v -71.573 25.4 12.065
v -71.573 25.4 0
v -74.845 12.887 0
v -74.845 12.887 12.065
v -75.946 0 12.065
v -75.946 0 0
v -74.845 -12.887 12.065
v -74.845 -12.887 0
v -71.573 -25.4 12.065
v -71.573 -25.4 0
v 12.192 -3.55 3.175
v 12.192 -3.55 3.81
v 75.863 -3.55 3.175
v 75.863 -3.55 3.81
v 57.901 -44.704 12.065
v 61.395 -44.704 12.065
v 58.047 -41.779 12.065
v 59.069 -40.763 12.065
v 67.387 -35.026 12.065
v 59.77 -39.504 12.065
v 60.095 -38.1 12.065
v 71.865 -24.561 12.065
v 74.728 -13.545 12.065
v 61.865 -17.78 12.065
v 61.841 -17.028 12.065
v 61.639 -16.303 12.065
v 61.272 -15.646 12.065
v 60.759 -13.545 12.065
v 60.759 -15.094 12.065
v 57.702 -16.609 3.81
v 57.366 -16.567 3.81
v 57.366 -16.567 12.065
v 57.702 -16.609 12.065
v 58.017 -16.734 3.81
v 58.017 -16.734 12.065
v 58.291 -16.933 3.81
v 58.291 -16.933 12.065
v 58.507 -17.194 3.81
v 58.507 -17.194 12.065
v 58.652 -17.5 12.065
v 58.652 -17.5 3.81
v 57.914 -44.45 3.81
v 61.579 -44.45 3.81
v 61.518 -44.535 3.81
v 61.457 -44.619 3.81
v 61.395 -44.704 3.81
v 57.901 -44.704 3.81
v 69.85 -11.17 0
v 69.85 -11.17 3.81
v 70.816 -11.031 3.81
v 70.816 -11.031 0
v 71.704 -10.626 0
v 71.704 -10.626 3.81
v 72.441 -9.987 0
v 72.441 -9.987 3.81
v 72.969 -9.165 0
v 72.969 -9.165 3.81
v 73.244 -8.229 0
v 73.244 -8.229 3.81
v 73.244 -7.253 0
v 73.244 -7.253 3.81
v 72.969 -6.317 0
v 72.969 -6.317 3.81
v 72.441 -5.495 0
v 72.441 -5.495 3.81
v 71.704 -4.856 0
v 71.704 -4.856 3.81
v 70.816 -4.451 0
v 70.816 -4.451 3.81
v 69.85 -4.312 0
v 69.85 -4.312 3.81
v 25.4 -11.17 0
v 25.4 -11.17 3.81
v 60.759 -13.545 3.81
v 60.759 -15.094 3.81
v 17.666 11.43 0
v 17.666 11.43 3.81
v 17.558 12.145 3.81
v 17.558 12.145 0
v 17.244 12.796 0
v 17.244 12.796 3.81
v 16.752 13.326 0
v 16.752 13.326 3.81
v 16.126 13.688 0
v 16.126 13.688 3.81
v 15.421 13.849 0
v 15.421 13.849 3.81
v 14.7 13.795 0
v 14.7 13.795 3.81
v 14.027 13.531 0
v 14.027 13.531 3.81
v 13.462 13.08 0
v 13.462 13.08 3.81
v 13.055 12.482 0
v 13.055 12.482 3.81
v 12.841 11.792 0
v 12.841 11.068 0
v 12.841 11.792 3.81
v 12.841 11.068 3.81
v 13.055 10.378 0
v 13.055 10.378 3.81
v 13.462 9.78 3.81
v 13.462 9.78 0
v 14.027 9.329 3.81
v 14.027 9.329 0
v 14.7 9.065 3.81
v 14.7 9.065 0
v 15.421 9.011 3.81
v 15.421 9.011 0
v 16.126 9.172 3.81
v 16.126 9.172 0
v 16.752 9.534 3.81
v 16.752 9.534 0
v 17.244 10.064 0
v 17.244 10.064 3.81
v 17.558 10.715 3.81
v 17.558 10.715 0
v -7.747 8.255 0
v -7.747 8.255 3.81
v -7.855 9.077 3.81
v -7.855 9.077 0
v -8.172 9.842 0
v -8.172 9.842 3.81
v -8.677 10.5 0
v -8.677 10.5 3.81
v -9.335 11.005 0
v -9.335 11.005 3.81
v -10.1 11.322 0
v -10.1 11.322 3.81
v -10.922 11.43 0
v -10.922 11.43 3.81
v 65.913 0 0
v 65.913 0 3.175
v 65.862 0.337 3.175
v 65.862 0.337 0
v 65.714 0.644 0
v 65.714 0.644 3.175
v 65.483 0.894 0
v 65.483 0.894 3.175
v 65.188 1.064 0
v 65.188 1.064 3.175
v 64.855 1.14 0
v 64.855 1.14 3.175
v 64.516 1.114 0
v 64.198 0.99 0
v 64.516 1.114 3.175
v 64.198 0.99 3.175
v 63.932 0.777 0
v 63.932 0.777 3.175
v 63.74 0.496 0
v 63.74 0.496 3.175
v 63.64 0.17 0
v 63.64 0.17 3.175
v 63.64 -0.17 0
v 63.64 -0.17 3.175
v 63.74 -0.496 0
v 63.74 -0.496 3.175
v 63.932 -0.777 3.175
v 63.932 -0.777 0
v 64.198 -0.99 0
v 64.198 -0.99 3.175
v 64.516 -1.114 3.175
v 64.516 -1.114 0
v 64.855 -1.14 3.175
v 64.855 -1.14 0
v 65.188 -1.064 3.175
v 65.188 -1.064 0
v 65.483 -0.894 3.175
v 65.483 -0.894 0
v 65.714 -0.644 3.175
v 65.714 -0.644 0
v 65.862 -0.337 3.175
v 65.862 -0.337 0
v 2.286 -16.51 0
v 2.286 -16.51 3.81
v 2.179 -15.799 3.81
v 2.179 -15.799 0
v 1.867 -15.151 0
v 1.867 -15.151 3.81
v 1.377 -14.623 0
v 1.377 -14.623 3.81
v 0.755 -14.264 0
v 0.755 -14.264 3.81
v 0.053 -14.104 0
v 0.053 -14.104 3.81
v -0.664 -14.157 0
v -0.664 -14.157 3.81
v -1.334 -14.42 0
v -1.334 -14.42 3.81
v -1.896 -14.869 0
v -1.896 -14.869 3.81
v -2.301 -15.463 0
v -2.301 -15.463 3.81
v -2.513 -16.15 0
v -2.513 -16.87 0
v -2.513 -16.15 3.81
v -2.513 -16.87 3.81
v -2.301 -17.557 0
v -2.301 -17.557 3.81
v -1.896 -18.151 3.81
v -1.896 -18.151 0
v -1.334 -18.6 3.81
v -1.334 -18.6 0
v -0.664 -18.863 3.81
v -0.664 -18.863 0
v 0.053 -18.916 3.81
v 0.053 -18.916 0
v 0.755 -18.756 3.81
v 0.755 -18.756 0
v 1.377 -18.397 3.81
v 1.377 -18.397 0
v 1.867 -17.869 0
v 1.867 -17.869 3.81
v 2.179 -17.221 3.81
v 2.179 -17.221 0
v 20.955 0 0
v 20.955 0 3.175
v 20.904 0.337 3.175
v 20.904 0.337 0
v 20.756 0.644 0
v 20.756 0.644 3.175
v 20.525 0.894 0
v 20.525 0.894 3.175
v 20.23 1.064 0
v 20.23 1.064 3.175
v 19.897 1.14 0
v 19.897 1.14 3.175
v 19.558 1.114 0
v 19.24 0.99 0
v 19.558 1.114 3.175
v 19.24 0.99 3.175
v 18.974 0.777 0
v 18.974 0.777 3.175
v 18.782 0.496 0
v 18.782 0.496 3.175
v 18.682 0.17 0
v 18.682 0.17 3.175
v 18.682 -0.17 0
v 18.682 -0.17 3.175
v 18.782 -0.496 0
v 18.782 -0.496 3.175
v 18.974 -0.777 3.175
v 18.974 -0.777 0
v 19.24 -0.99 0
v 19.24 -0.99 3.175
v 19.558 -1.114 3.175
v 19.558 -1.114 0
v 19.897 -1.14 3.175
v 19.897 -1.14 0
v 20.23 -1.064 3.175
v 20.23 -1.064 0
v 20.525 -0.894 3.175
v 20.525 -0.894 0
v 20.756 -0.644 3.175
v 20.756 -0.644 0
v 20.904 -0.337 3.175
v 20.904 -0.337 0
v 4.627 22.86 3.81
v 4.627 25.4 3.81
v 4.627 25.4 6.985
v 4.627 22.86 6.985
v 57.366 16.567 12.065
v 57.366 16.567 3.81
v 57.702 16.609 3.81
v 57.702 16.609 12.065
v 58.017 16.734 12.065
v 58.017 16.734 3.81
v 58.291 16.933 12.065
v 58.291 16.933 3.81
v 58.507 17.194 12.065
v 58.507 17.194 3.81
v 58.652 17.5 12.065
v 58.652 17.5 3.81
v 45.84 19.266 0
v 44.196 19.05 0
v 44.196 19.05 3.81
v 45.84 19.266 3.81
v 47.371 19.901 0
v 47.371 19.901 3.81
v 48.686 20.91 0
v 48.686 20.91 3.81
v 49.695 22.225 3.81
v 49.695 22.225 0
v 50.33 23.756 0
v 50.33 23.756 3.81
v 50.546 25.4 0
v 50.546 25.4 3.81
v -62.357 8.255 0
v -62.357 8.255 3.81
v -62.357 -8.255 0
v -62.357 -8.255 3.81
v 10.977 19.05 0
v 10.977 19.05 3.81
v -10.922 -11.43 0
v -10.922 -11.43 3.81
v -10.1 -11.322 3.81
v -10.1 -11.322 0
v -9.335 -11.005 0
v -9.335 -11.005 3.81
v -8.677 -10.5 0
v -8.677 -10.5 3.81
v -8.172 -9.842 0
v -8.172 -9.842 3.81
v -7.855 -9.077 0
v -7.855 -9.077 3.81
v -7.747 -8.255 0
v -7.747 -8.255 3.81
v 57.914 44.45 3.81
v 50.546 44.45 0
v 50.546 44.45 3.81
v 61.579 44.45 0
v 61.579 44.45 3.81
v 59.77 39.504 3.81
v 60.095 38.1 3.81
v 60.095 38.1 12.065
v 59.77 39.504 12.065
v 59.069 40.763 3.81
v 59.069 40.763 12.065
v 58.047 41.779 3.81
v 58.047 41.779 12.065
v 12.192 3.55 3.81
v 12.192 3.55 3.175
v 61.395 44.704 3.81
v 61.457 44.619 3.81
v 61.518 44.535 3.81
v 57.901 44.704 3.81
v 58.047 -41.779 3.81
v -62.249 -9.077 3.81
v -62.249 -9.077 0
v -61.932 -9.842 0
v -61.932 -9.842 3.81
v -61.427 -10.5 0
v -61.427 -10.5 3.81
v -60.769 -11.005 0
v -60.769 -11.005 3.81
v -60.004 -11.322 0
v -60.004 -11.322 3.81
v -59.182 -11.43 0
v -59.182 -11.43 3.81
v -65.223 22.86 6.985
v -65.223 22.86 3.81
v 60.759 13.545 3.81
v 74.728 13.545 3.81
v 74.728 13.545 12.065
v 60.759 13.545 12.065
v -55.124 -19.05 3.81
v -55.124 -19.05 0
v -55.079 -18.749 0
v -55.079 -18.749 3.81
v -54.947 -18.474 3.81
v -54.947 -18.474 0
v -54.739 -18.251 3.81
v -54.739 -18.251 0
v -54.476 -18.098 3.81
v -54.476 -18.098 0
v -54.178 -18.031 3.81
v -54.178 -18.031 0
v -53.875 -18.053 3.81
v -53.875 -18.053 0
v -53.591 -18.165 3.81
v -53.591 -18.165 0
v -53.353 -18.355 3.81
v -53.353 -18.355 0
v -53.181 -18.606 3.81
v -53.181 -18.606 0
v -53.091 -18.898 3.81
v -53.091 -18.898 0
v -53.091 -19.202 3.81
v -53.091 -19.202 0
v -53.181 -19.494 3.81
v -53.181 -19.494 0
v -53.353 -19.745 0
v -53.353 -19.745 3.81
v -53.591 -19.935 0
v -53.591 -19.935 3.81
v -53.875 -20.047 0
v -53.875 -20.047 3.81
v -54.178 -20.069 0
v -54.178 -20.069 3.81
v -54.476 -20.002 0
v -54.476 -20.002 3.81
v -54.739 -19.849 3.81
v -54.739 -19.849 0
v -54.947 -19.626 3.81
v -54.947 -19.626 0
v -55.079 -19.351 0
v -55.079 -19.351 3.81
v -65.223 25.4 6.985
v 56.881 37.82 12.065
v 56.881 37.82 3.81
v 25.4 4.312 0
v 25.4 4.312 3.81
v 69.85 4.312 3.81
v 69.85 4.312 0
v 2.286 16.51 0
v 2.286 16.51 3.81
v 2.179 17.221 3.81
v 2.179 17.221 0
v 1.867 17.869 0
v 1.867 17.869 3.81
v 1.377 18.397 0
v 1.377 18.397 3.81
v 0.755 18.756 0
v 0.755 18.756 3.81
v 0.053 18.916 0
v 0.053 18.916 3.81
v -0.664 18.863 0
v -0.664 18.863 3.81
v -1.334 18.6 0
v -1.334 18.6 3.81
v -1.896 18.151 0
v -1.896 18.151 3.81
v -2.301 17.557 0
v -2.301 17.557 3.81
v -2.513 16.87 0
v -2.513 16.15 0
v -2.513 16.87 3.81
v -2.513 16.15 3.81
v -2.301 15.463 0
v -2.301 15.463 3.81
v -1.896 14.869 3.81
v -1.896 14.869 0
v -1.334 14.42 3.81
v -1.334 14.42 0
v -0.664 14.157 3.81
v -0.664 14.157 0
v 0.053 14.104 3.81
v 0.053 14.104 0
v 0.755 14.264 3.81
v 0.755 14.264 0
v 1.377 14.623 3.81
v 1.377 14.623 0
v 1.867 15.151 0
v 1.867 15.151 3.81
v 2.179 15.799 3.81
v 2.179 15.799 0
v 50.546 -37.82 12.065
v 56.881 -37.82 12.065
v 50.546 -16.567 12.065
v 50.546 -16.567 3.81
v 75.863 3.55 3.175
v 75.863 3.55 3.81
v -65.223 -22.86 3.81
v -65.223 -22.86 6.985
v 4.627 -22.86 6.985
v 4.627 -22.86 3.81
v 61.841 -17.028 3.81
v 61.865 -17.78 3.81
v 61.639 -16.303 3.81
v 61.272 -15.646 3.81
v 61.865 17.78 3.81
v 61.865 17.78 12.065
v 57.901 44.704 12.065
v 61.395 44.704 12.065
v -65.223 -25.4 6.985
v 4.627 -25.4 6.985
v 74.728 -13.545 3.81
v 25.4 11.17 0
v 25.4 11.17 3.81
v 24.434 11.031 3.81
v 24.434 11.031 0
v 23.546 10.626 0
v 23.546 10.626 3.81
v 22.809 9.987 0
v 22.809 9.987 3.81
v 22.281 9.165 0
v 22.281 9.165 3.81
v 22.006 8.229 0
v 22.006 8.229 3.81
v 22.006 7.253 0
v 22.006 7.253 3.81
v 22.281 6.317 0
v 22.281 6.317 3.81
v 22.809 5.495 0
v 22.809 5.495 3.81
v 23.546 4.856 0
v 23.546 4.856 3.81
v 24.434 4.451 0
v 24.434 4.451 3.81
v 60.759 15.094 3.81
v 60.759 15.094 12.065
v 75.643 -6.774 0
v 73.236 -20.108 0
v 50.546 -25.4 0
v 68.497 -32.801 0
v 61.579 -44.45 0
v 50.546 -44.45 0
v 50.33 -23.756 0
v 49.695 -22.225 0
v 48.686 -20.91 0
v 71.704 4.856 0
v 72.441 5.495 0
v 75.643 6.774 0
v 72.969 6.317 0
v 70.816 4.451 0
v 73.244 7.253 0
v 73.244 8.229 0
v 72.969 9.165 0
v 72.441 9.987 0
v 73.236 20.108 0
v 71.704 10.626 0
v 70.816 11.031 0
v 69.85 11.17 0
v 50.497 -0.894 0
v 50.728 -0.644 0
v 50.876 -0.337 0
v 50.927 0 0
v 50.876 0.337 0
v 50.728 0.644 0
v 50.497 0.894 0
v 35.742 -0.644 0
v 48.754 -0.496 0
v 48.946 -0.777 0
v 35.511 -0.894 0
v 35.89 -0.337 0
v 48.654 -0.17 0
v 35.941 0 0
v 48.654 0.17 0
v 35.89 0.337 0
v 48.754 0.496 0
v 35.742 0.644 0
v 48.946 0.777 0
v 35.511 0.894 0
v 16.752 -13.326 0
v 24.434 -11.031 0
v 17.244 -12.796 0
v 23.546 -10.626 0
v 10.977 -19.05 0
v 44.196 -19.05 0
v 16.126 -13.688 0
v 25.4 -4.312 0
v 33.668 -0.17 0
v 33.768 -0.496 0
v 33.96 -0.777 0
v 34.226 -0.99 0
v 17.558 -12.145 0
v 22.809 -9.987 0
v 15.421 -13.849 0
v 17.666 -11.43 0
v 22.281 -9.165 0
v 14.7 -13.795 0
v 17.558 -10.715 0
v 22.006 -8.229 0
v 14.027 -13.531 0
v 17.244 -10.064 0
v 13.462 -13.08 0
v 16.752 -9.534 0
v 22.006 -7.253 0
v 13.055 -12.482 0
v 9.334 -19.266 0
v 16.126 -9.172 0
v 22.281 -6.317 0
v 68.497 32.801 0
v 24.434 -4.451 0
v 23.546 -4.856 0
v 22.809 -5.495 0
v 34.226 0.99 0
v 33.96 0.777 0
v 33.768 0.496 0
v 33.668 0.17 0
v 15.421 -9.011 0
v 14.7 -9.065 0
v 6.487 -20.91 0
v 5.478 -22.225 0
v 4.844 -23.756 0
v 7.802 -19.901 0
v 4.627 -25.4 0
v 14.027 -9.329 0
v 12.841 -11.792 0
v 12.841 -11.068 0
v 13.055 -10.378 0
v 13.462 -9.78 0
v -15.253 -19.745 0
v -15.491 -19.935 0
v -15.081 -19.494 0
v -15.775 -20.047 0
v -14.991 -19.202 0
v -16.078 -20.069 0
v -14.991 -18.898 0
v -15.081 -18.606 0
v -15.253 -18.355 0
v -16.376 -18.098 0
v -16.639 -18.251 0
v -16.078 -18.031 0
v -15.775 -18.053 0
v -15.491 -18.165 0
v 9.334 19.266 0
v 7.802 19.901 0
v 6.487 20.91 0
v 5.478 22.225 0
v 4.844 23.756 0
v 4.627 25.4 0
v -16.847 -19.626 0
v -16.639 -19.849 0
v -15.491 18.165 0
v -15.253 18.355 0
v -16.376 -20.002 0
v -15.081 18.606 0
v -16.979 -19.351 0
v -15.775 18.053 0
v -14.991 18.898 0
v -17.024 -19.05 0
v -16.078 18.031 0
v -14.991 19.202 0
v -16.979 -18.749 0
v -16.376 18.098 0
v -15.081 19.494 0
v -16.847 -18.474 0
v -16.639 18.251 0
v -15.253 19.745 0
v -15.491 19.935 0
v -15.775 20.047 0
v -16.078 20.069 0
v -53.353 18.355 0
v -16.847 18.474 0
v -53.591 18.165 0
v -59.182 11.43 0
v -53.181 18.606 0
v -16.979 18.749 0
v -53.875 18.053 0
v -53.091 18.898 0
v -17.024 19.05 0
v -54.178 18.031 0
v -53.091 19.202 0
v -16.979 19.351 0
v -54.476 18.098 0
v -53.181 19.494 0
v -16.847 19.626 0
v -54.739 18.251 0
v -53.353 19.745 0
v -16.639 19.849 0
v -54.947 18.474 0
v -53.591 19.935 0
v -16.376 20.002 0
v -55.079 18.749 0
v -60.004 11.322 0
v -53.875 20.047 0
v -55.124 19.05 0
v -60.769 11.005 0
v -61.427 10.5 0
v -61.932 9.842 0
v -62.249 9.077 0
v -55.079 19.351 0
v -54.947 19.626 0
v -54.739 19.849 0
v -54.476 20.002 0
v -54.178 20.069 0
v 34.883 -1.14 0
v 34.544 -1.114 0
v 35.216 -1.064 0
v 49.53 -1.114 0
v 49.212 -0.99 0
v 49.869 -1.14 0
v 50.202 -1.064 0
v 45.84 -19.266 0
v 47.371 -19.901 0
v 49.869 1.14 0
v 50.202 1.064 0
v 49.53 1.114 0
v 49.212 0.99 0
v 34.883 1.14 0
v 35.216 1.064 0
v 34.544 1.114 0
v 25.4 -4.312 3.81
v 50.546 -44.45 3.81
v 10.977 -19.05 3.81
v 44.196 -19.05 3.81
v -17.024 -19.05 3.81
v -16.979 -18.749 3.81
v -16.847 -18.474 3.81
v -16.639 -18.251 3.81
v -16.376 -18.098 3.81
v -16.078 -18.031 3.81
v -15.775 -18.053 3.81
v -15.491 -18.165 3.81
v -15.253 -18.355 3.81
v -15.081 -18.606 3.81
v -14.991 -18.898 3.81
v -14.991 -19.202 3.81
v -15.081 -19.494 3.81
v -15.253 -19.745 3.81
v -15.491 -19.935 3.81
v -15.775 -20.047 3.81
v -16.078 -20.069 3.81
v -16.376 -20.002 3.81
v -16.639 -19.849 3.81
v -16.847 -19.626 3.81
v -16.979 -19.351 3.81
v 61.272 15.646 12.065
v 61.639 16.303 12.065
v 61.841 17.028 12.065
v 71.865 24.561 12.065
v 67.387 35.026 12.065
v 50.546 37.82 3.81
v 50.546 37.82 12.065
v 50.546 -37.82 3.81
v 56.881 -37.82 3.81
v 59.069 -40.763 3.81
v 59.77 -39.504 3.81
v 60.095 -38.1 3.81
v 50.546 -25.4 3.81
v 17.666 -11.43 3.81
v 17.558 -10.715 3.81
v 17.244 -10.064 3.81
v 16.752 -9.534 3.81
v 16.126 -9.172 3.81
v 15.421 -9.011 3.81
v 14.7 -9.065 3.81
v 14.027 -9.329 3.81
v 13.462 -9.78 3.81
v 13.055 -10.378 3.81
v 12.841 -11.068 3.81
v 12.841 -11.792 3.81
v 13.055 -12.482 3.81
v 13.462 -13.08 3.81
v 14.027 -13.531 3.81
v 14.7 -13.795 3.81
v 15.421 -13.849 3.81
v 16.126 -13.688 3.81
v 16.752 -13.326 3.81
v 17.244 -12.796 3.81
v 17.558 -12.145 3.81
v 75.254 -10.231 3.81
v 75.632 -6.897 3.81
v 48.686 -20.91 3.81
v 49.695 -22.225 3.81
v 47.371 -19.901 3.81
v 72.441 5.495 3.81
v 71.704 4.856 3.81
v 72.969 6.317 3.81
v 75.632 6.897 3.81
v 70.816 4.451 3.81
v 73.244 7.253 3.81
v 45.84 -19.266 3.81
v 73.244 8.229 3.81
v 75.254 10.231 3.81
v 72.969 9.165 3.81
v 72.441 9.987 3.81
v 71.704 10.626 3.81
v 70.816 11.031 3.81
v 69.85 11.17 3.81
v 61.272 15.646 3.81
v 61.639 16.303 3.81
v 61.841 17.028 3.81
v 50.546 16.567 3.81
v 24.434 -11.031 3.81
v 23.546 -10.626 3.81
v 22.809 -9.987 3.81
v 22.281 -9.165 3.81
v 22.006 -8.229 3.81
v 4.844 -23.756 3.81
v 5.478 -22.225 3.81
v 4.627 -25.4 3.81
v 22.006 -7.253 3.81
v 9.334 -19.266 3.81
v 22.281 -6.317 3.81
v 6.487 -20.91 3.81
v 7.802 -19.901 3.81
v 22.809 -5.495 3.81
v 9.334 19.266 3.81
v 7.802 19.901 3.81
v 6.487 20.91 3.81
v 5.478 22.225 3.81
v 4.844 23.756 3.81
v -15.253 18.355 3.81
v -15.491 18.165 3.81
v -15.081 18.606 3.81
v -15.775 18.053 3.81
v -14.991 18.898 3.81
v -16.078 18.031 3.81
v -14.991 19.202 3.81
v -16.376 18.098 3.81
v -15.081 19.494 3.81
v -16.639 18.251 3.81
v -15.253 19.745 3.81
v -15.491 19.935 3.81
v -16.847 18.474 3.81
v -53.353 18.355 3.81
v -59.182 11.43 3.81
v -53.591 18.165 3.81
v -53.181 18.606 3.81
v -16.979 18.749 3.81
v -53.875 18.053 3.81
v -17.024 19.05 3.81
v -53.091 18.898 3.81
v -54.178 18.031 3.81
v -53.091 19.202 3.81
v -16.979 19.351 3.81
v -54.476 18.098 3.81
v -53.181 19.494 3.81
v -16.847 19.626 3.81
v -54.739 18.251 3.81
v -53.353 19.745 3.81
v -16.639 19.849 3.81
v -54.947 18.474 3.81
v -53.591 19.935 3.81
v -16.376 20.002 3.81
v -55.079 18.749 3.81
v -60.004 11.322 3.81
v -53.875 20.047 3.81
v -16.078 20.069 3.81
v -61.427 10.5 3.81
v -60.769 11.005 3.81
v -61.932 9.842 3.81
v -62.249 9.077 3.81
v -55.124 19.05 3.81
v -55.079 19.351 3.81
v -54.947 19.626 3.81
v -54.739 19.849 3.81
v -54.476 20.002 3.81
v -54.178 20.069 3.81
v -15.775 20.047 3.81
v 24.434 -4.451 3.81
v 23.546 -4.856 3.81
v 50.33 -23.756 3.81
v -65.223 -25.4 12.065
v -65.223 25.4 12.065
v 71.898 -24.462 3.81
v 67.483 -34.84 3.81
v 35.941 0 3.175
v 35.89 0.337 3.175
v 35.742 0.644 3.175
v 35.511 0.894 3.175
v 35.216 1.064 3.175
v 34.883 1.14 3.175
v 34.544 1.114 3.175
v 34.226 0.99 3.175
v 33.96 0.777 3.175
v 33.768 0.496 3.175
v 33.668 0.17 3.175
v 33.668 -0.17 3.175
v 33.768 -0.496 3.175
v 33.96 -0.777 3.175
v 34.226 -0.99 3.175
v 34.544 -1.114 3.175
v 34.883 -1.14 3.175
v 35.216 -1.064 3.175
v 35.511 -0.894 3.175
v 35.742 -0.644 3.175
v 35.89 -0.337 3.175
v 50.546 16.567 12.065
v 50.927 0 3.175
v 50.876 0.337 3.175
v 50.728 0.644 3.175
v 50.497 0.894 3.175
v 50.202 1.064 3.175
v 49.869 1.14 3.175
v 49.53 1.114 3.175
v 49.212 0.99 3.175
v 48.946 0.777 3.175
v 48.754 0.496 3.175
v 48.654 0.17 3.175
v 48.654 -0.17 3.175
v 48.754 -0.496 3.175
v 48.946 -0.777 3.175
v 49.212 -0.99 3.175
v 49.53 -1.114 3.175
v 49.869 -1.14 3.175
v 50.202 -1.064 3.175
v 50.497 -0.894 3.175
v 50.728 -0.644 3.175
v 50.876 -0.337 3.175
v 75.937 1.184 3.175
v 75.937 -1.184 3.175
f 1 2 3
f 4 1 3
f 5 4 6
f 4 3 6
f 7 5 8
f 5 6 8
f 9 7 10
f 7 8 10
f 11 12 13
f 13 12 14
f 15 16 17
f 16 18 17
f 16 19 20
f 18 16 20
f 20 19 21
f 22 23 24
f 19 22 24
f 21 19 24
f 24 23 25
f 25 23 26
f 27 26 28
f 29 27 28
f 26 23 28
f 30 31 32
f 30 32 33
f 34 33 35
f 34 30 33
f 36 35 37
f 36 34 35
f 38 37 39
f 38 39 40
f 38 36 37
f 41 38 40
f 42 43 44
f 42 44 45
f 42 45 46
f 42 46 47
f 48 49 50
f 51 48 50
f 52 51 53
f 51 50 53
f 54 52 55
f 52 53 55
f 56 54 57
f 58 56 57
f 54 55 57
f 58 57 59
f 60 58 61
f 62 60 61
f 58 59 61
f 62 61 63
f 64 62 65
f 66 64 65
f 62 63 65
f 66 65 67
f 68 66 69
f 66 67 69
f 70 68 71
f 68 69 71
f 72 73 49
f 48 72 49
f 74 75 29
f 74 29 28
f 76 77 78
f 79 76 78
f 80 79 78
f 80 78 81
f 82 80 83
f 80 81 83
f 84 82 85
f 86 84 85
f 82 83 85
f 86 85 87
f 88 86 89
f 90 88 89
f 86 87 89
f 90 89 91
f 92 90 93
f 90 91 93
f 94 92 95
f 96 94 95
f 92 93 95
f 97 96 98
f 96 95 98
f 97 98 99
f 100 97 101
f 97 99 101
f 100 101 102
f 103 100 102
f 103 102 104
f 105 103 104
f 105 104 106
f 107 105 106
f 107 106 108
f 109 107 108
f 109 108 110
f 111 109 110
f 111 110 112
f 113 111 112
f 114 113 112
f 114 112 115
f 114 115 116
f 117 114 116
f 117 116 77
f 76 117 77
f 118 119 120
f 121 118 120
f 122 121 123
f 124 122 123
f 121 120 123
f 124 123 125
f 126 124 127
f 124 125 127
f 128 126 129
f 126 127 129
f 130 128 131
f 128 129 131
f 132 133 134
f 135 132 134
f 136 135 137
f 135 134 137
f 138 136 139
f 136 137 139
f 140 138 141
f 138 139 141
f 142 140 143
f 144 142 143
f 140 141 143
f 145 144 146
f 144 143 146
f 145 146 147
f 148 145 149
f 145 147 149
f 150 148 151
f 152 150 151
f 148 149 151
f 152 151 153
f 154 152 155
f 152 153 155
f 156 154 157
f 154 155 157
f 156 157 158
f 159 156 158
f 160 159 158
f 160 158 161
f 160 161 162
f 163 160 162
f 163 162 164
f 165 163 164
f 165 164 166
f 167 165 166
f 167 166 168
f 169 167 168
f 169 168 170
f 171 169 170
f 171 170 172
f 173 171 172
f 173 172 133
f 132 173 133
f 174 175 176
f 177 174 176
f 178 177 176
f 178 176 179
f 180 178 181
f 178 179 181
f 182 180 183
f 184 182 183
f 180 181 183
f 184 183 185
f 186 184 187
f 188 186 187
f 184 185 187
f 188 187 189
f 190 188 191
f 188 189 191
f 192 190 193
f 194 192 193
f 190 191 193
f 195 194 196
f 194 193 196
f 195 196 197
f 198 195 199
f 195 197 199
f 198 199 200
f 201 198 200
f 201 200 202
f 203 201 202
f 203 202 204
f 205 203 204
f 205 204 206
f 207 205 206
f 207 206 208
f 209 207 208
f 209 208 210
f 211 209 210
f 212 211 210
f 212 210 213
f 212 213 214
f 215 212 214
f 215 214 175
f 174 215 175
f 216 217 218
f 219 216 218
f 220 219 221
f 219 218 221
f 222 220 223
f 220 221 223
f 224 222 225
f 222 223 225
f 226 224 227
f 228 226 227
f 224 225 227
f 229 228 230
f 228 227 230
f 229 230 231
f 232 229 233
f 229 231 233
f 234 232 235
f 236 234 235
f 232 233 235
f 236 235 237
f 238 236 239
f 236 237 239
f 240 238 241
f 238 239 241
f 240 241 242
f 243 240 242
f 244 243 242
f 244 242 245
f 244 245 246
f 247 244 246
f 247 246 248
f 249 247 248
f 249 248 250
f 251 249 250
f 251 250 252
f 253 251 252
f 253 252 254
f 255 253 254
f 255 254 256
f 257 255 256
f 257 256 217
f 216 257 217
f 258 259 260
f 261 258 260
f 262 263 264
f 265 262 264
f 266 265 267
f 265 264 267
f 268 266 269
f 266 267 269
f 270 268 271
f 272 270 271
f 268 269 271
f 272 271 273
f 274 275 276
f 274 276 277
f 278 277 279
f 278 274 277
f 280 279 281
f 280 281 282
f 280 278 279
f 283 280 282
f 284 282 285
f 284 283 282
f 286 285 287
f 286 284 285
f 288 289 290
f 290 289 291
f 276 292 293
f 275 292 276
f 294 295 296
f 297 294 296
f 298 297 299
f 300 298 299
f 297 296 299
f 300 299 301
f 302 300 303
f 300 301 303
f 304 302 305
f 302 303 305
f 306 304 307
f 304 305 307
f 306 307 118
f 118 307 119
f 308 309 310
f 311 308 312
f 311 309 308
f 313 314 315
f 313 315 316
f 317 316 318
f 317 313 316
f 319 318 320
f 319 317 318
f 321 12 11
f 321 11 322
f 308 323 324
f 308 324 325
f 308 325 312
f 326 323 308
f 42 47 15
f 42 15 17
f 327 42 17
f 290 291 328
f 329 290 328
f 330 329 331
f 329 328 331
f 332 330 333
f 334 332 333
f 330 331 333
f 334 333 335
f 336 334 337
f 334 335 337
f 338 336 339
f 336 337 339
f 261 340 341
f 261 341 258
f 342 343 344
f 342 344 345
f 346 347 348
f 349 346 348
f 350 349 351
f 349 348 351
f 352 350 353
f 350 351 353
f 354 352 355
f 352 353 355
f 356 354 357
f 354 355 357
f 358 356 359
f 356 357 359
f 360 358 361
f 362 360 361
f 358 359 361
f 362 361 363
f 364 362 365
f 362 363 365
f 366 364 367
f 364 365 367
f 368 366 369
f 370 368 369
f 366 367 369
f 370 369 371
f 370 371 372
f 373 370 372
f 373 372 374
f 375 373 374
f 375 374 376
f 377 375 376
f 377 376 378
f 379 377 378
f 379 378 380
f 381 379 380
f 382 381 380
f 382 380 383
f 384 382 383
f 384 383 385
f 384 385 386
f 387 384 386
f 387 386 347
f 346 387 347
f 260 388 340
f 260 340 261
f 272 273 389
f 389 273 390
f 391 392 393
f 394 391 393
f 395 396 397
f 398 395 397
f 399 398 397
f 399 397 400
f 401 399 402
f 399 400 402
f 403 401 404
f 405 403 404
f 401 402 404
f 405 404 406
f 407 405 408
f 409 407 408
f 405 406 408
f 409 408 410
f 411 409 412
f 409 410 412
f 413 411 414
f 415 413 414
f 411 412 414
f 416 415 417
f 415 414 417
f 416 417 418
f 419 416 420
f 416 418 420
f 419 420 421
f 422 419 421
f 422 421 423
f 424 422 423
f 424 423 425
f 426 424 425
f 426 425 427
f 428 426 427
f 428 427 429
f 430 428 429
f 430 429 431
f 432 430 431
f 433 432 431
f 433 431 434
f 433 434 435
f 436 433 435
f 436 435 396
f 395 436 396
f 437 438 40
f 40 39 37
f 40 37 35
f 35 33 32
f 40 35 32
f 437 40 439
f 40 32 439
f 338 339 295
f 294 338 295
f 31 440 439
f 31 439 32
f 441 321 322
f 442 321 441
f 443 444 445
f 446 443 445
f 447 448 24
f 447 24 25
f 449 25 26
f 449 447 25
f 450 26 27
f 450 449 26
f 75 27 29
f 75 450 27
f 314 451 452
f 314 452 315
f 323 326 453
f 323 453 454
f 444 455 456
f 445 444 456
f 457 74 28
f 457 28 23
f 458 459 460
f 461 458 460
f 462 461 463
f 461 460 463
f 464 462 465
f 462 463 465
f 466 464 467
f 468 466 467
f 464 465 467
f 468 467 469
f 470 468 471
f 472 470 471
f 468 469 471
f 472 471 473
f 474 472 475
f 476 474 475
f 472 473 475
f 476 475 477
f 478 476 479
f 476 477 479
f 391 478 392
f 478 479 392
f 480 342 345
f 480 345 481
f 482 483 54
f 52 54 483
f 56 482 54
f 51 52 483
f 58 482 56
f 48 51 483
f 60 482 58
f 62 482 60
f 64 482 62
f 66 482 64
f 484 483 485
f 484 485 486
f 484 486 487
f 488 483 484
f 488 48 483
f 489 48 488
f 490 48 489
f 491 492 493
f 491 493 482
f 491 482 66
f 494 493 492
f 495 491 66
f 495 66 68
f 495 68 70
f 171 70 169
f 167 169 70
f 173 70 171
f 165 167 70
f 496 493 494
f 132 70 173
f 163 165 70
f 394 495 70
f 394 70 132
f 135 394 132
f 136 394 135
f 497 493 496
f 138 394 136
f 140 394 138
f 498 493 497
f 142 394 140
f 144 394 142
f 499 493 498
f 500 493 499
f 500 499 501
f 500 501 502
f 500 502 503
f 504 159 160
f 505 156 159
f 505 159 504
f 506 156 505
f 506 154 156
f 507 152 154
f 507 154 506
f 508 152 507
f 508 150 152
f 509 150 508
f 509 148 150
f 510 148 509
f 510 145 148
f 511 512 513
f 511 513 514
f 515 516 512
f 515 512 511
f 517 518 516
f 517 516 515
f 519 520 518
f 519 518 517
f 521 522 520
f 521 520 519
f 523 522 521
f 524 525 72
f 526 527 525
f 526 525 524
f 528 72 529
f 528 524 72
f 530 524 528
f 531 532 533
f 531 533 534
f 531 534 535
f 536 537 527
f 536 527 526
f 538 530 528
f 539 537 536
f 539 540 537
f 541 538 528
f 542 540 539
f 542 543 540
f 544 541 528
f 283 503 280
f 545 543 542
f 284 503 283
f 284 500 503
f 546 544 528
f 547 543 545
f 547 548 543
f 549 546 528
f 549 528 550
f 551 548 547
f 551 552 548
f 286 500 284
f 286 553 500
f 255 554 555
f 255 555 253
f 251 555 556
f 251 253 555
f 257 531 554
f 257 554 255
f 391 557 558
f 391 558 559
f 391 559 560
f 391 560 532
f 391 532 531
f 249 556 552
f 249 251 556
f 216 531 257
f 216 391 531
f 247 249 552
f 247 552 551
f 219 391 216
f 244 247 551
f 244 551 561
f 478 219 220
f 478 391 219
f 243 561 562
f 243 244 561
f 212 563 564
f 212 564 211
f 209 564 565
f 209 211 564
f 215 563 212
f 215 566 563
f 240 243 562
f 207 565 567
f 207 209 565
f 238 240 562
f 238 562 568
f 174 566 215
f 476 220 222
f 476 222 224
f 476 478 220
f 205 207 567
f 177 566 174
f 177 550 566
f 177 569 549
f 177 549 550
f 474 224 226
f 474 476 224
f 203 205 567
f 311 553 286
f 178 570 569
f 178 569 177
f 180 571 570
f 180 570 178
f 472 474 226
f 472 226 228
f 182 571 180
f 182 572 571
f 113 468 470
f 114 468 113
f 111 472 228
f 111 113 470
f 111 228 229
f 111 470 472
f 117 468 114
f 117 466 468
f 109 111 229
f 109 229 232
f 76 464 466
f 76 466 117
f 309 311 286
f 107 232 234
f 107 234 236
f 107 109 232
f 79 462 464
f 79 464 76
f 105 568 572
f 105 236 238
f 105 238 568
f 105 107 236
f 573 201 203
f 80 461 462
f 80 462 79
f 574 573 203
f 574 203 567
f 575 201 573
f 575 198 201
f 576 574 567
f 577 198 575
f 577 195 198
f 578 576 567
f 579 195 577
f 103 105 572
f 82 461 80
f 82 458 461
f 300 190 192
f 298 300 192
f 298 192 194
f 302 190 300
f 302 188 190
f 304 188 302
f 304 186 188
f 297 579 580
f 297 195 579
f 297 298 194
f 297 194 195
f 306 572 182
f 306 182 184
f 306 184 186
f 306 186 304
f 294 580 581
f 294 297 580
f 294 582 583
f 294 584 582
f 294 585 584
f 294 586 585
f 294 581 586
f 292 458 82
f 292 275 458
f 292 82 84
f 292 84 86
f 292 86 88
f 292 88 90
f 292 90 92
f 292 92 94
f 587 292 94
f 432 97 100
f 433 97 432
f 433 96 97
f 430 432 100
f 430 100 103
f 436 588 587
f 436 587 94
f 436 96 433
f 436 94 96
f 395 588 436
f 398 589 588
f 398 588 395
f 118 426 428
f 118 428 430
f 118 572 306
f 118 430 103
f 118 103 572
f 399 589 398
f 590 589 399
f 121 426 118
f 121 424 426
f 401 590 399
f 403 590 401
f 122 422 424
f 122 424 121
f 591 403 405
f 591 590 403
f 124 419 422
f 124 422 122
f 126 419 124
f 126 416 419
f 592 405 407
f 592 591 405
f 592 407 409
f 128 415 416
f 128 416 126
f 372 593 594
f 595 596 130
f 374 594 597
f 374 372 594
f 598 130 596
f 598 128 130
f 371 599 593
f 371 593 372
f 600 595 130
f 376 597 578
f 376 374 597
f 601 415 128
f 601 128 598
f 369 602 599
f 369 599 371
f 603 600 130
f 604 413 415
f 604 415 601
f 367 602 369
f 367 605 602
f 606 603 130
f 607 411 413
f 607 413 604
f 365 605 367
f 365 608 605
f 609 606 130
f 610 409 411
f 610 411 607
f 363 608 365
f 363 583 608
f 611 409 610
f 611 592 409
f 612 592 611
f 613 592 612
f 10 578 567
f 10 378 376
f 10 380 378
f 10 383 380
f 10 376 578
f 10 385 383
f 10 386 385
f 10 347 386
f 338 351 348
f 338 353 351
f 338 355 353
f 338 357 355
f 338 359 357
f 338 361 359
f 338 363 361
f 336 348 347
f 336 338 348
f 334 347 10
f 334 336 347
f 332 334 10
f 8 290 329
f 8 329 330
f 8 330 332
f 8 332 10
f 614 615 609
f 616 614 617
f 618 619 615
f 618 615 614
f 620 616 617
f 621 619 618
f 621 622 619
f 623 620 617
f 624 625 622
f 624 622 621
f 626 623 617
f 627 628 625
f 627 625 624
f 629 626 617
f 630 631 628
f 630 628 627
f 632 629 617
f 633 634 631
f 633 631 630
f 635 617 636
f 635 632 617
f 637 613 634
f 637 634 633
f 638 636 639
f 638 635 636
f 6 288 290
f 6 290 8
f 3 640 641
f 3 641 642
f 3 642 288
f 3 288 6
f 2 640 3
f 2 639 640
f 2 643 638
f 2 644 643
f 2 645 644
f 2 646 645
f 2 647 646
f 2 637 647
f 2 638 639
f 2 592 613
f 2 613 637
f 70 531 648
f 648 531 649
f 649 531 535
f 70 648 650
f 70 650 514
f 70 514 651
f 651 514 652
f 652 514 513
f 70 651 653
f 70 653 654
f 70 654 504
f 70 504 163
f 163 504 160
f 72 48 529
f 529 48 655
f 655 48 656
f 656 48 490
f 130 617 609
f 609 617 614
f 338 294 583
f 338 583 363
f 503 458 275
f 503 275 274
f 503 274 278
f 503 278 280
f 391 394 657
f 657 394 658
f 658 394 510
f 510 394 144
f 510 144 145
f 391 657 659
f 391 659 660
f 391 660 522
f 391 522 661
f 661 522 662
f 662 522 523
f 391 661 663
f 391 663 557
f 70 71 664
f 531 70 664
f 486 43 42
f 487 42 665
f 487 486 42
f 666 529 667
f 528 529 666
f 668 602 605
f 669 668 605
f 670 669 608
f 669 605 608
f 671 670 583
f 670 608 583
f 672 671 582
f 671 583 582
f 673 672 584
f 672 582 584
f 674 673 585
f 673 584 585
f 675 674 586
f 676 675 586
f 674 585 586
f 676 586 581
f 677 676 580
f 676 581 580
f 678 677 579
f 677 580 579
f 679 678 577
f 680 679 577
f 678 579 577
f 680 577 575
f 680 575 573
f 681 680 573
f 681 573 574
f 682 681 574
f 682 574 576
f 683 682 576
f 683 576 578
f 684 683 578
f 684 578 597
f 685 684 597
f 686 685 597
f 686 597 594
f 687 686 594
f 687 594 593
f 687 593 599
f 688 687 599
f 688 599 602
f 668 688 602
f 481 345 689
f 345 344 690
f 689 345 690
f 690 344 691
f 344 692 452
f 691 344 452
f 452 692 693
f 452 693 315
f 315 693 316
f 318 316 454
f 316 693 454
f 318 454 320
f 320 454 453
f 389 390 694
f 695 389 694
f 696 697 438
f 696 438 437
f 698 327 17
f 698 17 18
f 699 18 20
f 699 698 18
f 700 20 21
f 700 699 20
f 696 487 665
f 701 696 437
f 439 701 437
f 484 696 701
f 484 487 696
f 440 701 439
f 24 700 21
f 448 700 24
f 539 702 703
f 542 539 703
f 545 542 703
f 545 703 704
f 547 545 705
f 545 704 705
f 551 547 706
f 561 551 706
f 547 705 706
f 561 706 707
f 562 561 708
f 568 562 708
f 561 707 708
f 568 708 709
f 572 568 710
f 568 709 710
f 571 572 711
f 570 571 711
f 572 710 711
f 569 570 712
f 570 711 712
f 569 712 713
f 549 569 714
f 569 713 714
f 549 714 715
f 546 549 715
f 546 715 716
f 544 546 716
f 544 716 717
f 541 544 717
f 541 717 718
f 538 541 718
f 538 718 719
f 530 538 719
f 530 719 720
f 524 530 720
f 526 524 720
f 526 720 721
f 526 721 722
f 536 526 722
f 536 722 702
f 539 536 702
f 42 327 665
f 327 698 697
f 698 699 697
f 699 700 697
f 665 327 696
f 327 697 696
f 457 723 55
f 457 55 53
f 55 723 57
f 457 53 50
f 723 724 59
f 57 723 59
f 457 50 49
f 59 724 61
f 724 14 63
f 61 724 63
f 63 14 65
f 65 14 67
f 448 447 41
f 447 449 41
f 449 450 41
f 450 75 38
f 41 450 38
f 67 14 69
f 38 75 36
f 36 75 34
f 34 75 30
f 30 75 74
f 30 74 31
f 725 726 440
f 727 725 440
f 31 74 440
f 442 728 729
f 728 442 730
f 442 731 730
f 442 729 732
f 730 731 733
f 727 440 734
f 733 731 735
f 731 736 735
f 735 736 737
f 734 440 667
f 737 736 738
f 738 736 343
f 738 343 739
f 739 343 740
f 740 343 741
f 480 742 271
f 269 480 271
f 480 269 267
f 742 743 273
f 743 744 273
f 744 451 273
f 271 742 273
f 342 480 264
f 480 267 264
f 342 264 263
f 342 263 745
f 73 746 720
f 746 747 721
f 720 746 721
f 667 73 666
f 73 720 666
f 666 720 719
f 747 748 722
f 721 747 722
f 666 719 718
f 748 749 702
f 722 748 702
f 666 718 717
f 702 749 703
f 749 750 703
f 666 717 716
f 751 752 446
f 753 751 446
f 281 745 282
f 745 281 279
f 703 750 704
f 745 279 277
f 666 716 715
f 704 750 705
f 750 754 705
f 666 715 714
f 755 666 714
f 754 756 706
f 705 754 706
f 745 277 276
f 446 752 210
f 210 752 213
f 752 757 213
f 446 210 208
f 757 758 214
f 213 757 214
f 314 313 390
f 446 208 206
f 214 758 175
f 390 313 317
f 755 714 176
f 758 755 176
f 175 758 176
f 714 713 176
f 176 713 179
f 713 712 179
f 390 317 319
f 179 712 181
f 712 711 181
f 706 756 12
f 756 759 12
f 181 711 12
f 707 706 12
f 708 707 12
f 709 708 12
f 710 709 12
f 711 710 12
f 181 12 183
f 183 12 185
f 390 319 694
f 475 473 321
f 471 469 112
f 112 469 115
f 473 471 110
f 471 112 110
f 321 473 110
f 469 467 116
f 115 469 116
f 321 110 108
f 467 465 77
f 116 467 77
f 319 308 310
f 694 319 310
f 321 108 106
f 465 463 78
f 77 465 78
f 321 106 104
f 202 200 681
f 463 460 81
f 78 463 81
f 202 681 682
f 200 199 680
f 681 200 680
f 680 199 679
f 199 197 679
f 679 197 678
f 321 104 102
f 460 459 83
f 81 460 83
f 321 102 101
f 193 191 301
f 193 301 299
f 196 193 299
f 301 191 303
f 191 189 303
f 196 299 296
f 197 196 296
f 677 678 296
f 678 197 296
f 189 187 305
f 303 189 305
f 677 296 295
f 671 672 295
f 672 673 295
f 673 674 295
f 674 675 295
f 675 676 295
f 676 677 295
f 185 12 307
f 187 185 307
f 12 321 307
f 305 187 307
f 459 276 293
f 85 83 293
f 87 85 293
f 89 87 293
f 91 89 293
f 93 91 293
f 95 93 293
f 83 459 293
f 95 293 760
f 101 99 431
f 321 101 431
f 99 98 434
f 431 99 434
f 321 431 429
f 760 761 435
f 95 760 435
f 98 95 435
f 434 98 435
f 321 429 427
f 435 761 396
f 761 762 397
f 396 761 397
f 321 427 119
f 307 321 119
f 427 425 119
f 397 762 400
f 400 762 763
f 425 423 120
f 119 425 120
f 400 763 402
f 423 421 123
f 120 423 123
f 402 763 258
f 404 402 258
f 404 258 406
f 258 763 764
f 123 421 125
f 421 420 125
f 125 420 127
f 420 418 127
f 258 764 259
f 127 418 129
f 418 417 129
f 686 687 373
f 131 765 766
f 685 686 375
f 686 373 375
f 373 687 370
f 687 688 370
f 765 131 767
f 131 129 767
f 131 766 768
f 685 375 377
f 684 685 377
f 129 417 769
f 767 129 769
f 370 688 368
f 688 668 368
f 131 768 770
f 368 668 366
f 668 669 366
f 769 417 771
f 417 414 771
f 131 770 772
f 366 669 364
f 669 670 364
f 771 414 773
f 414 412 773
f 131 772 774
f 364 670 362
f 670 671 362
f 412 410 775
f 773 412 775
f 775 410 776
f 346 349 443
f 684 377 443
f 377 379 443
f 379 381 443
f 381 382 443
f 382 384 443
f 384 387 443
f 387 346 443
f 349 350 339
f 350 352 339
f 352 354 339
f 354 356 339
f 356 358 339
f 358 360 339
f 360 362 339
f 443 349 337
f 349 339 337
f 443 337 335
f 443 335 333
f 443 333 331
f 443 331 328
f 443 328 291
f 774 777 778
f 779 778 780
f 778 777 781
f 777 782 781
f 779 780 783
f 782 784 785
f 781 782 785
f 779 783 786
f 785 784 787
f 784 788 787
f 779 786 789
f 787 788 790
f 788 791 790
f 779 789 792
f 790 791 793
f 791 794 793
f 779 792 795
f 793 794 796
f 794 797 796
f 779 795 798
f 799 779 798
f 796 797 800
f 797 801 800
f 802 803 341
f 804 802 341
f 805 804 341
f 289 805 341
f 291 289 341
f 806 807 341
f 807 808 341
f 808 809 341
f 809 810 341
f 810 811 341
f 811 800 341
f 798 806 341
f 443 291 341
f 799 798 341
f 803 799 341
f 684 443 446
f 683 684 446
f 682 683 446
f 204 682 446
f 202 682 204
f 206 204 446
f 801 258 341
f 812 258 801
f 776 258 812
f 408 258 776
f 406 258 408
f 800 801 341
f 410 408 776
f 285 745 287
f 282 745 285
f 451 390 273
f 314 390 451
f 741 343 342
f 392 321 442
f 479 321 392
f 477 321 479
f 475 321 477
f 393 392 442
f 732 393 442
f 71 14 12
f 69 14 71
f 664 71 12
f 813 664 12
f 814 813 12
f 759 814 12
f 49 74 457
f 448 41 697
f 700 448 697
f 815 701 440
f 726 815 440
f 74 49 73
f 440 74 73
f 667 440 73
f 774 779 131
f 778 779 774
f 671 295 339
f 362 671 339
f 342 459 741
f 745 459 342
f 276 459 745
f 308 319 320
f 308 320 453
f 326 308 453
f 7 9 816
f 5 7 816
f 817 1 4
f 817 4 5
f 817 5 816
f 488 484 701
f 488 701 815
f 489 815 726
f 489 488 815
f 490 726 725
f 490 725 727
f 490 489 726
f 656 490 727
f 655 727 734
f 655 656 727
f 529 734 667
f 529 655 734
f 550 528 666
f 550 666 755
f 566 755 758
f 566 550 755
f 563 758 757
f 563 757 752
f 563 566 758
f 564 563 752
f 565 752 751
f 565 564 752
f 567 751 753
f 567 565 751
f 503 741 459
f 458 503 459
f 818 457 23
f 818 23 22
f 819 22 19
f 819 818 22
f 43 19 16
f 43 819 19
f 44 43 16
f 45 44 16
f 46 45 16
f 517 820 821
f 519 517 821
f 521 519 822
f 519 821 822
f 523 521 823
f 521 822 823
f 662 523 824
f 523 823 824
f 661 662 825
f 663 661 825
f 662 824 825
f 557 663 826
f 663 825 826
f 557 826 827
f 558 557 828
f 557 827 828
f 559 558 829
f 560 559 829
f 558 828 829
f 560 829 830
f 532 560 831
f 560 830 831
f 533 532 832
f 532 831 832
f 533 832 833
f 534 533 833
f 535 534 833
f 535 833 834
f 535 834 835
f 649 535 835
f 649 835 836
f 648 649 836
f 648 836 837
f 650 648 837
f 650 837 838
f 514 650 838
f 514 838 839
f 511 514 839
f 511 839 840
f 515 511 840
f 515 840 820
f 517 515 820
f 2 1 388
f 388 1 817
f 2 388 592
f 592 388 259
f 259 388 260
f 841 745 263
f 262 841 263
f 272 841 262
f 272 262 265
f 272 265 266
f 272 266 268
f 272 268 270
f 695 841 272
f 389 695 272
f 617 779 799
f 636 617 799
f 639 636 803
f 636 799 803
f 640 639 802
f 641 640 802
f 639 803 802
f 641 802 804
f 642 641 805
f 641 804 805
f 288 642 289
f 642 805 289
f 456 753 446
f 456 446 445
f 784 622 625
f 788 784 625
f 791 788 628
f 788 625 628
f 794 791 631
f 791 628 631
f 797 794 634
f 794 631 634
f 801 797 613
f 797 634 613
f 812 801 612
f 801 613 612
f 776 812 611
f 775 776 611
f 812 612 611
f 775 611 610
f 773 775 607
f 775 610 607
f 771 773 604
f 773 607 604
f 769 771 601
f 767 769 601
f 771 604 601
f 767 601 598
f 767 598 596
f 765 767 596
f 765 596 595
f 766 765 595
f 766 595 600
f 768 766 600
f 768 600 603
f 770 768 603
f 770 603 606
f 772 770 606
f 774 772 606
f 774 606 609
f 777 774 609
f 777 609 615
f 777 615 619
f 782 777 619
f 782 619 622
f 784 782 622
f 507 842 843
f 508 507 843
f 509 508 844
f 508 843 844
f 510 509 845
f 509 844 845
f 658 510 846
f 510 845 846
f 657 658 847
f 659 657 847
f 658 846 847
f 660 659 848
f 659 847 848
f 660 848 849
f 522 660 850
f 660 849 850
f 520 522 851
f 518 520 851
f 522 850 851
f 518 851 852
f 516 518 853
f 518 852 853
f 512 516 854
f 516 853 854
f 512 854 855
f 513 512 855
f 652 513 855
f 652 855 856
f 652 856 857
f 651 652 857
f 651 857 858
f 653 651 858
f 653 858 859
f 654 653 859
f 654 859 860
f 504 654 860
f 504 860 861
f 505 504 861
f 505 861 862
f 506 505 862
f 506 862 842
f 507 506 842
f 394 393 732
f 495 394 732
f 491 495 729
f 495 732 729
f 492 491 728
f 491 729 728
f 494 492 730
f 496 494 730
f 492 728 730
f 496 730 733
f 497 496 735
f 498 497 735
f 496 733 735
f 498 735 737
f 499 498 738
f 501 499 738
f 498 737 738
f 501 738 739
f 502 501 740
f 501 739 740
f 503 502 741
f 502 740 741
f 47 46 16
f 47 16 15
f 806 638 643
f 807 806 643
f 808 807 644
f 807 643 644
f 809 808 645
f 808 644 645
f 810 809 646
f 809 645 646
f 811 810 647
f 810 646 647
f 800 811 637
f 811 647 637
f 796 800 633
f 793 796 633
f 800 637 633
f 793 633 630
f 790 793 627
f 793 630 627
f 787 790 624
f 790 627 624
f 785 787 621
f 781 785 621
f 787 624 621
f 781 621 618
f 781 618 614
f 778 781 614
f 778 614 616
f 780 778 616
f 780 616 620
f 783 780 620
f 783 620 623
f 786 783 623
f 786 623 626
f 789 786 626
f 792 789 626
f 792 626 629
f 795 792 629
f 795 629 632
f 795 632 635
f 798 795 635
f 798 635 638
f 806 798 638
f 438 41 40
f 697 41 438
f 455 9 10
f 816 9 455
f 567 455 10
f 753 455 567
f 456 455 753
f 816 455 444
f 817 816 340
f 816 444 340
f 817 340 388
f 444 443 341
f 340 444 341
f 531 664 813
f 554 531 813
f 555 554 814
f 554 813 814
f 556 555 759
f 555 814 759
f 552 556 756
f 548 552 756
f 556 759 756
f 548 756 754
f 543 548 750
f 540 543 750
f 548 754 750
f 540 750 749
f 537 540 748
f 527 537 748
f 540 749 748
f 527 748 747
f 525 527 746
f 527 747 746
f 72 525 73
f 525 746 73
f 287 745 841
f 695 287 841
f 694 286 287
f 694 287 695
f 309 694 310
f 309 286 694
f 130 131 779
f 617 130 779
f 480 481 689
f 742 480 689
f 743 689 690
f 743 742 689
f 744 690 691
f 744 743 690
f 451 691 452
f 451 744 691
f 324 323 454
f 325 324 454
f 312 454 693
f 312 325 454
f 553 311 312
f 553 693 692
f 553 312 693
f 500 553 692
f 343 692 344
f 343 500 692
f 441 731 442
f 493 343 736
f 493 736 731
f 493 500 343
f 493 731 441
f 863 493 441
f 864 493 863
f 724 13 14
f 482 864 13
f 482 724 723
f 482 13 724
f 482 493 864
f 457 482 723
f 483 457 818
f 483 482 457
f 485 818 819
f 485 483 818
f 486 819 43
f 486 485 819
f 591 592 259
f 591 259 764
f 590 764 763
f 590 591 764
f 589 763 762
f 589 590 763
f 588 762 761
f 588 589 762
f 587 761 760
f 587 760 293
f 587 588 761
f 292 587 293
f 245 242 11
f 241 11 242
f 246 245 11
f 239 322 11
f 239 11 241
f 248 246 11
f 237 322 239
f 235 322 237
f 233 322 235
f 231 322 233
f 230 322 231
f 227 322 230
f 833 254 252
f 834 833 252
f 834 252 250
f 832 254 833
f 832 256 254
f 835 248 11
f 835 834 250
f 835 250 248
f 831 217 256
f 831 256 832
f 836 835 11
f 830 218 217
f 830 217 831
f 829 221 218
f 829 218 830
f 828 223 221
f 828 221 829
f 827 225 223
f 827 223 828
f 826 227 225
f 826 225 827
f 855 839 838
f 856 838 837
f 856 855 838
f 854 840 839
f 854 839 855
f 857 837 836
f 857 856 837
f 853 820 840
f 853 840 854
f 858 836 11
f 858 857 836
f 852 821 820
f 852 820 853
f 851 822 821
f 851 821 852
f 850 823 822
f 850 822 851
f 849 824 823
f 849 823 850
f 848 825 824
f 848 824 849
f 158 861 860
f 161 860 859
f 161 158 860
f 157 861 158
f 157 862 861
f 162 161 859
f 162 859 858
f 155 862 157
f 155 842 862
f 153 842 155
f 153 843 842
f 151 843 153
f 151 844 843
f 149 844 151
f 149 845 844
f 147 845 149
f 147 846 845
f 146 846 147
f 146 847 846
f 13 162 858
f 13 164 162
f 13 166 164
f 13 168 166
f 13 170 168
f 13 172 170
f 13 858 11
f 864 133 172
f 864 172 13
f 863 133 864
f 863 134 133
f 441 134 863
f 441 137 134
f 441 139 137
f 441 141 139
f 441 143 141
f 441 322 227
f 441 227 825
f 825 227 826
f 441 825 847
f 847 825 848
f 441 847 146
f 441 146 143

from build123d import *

# Parameters (mm, degrees)
BOSS_EXTRUDE1_DEPTH = 3.81
BOSS_EXTRUDE2_DEPTH = 8.255
SKETCH3_W           = 64.77
SKETCH3_H           = 7.1
CUT_EXTRUDE1_DEPTH  = 0.635
CUT_EXTRUDE4_DEPTH  = 4.81
CUT_EXTRUDE5_DEPTH  = 4.81
SKETCH12_R          = 2.4257
CUT_EXTRUDE6_DEPTH  = 4.81
SKETCH4_R           = 1.143
CUT_EXTRUDE2_DEPTH  = 11.43
SKETCH17_R          = 2.413
CUT_EXTRUDE9_DEPTH  = 4.81
BOSS_EXTRUDE5_DEPTH = 8.255
SKETCH20_W          = 69.85
SKETCH20_H          = 3.175
BOSS_EXTRUDE6_DEPTH = 2.54
SKETCH21_R          = 1.02235
CUT_EXTRUDE10_DEPTH = 13.065


with BuildPart() as part:
    # Sketch1 → Boss-Extrude1 (new body)
    with BuildSketch(Plane.XY):
        with BuildLine():
            Line((10.977415053, 19.05), (44.196, 19.05))
            ThreePointArc((44.196, 19.05), (48.686128061, 20.909871939), (50.546, 25.4))
            Line((50.546, 25.4), (50.546, 44.45))
            Line((50.546, 44.45), (61.579155694, 44.45))
            ThreePointArc((61.579155694, 44.45), (75.946, 0), (61.579155694, -44.45))
            Line((61.579155694, -44.45), (50.546, -44.45))
            Line((50.546, -44.45), (50.546, -25.4))
            ThreePointArc((50.546, -25.4), (48.686128061, -20.909871939), (44.196, -19.05))
            Line((44.196, -19.05), (10.977415053, -19.05))
            ThreePointArc((10.977415053, -19.05), (6.487286992, -20.909871939), (4.627415053, -25.4))
            Line((4.627415053, -25.4), (-71.572584947, -25.4))
            ThreePointArc((-71.572584947, -25.4), (-75.946, 0), (-71.572584947, 25.4))
            Line((-71.572584947, 25.4), (4.627415053, 25.4))
            ThreePointArc((4.627415053, 25.4), (6.487286992, 20.909871939), (10.977415053, 19.05))
        make_face()
    extrude(amount=BOSS_EXTRUDE1_DEPTH)

    # Sketch2 → Boss-Extrude2 (add)
    with BuildSketch(Plane.XY.offset(3.81)):
        with BuildLine():
            Line((61.865268471, 17.78), (60.095110466, 38.1))
            ThreePointArc((60.095110466, 38.1), (59.464196764, 40.158289632), (58.047089349, 41.778911391))
            Line((58.047089349, 41.778911391), (57.900800643, 44.704))
            Line((57.900800643, 44.704), (61.395010384, 44.704))
            ThreePointArc((61.395010384, 44.704), (69.822038137, 29.877715884), (74.728381149, 13.544887112))
            Line((74.728381149, 13.544887112), (60.759450402, 13.544887112))
            Line((60.759450402, 13.544887112), (60.759450402, 15.094127876))
            ThreePointArc((60.759450402, 15.094127876), (61.639191639, 16.302501703), (61.865268471, 17.78))
        make_face()
        with BuildLine():
            Line((58.651639318, 17.500047669), (56.881481313, 37.820047669))
            Line((56.881481313, 37.820047669), (50.546, 37.820047669))
            Line((50.546, 37.820047669), (50.546, 16.566735288))
            Line((50.546, 16.566735288), (57.366094516, 16.566735288))
            ThreePointArc((57.366094516, 16.566735288), (58.160401987, 16.824667019), (58.651639318, 17.500047669))
        make_face()
        with BuildLine():
            Line((60.759450402, -13.544887112), (74.728381149, -13.544887112))
            ThreePointArc((74.728381149, -13.544887112), (69.822038137, -29.877715884), (61.395010384, -44.704))
            Line((61.395010384, -44.704), (57.900800643, -44.704))
            Line((57.900800643, -44.704), (58.047089349, -41.778911391))
            ThreePointArc((58.047089349, -41.778911391), (59.464196764, -40.158289632), (60.095110466, -38.1))
            Line((60.095110466, -38.1), (61.865268471, -17.78))
            ThreePointArc((61.865268471, -17.78), (61.639191639, -16.302501703), (60.759450402, -15.094127876))
            Line((60.759450402, -15.094127876), (60.759450402, -13.544887112))
        make_face()
        with BuildLine():
            Line((50.546, -16.566735288), (57.366094516, -16.566735288))
            ThreePointArc((57.366094516, -16.566735288), (58.160401987, -16.824667019), (58.651639318, -17.500047669))
            Line((58.651639318, -17.500047669), (56.881481313, -37.820047669))
            Line((56.881481313, -37.820047669), (50.546, -37.820047669))
            Line((50.546, -37.820047669), (50.546, -16.566735288))
        make_face()
    extrude(amount=BOSS_EXTRUDE2_DEPTH)

    # Sketch3 → Cut-Extrude1 (cut)
    with BuildSketch(Plane.XY.offset(3.81)):
        with Locations((44.577, 0)):
            Rectangle(SKETCH3_W, SKETCH3_H)
    extrude(amount=-CUT_EXTRUDE1_DEPTH, mode=Mode.SUBTRACT)

    # Sketch9 → Cut-Extrude4 (cut, through all)
    with BuildSketch(Plane.XY.offset(3.81)):
        with BuildLine():
            Line((69.85, 11.17), (25.4, 11.17))
            ThreePointArc((25.4, 11.17), (21.971, 7.741), (25.4, 4.312))
            Line((25.4, 4.312), (69.85, 4.312))
            ThreePointArc((69.85, 4.312), (73.279, 7.741), (69.85, 11.17))
        make_face()
        with BuildLine():
            Line((69.85, -4.312), (25.4, -4.312))
            ThreePointArc((25.4, -4.312), (21.971, -7.741), (25.4, -11.17))
            Line((25.4, -11.17), (69.85, -11.17))
            ThreePointArc((69.85, -11.17), (73.279, -7.741), (69.85, -4.312))
        make_face()
    extrude(amount=-CUT_EXTRUDE4_DEPTH, mode=Mode.SUBTRACT)

    # Sketch10 → Cut-Extrude5 (cut, through all)
    with BuildSketch(Plane.XY.offset(3.81)):
        with BuildLine():
            Line((-10.922, 11.43), (-59.182, 11.43))
            ThreePointArc((-59.182, 11.43), (-61.42706403, 10.50006403), (-62.357, 8.255))
            Line((-62.357, 8.255), (-62.357, -8.255))
            ThreePointArc((-62.357, -8.255), (-61.42706403, -10.50006403), (-59.182, -11.43))
            Line((-59.182, -11.43), (-10.922, -11.43))
            ThreePointArc((-10.922, -11.43), (-8.67693597, -10.50006403), (-7.747, -8.255))
            Line((-7.747, -8.255), (-7.747, 8.255))
            ThreePointArc((-7.747, 8.255), (-8.67693597, 10.50006403), (-10.922, 11.43))
        make_face()
    extrude(amount=-CUT_EXTRUDE5_DEPTH, mode=Mode.SUBTRACT)

    # Sketch12 → Cut-Extrude6 (cut, through all)
    with BuildSketch(Plane.XY.offset(3.81)):
        with Locations((15.24, 11.43)):
            Circle(SKETCH12_R)
        with Locations((15.24, -11.43)):
            Circle(SKETCH12_R)
    extrude(amount=-CUT_EXTRUDE6_DEPTH, mode=Mode.SUBTRACT)

    # Sketch4 → Cut-Extrude2 (cut)
    with BuildSketch(Plane.XY.offset(3.175)):
        with Locations((19.812, 0)):
            Circle(SKETCH4_R)
        with Locations((34.798, 0)):
            Circle(SKETCH4_R)
        with Locations((49.784, 0)):
            Circle(SKETCH4_R)
        with Locations((64.77, 0)):
            Circle(SKETCH4_R)
    extrude(amount=-CUT_EXTRUDE2_DEPTH, mode=Mode.SUBTRACT)

    # Sketch17 → Cut-Extrude9 (cut, through all)
    with BuildSketch(Plane.XY.offset(3.81)):
        with Locations((-0.127, 16.51)):
            Circle(SKETCH17_R)
        with Locations((-0.127, -16.51)):
            Circle(SKETCH17_R)
    extrude(amount=-CUT_EXTRUDE9_DEPTH, mode=Mode.SUBTRACT)

    # Sketch19 → Boss-Extrude5 (add)
    with BuildSketch(Plane.XY.offset(3.81)):
        with BuildLine():
            Line((-71.572584947, -25.4), (-65.222584947, -25.4))
            Line((-65.222584947, -25.4), (-65.222584947, 25.4))
            Line((-65.222584947, 25.4), (-71.572584947, 25.4))
            ThreePointArc((-71.572584947, 25.4), (-75.946, 0), (-71.572584947, -25.4))
        make_face()
    extrude(amount=BOSS_EXTRUDE5_DEPTH)

    # Sketch20 → Boss-Extrude6 (add)
    with BuildSketch(Plane.XZ.offset(25.4)):
        with Locations((-30.297584947, 5.3975)):
            Rectangle(SKETCH20_W, SKETCH20_H)
    boss_extrude6 = extrude(amount=-BOSS_EXTRUDE6_DEPTH)

    # Mirror1: Boss-Extrude6 across plane
    add(boss_extrude6.mirror(Plane.ZX))

    # Sketch21 → Cut-Extrude10 (cut, through all)
    with BuildSketch(Plane(origin=(0, 0, 0), x_dir=(-1, 0, 0), z_dir=(0, 0, -1))):
        with Locations((54.102, 19.05)):
            Circle(SKETCH21_R)
        with Locations((16.002, 19.05)):
            Circle(SKETCH21_R)
        with Locations((16.002, -19.05)):
            Circle(SKETCH21_R)
        with Locations((54.102, -19.05)):
            Circle(SKETCH21_R)
    extrude(amount=-CUT_EXTRUDE10_DEPTH, mode=Mode.SUBTRACT)


solid = part.part
